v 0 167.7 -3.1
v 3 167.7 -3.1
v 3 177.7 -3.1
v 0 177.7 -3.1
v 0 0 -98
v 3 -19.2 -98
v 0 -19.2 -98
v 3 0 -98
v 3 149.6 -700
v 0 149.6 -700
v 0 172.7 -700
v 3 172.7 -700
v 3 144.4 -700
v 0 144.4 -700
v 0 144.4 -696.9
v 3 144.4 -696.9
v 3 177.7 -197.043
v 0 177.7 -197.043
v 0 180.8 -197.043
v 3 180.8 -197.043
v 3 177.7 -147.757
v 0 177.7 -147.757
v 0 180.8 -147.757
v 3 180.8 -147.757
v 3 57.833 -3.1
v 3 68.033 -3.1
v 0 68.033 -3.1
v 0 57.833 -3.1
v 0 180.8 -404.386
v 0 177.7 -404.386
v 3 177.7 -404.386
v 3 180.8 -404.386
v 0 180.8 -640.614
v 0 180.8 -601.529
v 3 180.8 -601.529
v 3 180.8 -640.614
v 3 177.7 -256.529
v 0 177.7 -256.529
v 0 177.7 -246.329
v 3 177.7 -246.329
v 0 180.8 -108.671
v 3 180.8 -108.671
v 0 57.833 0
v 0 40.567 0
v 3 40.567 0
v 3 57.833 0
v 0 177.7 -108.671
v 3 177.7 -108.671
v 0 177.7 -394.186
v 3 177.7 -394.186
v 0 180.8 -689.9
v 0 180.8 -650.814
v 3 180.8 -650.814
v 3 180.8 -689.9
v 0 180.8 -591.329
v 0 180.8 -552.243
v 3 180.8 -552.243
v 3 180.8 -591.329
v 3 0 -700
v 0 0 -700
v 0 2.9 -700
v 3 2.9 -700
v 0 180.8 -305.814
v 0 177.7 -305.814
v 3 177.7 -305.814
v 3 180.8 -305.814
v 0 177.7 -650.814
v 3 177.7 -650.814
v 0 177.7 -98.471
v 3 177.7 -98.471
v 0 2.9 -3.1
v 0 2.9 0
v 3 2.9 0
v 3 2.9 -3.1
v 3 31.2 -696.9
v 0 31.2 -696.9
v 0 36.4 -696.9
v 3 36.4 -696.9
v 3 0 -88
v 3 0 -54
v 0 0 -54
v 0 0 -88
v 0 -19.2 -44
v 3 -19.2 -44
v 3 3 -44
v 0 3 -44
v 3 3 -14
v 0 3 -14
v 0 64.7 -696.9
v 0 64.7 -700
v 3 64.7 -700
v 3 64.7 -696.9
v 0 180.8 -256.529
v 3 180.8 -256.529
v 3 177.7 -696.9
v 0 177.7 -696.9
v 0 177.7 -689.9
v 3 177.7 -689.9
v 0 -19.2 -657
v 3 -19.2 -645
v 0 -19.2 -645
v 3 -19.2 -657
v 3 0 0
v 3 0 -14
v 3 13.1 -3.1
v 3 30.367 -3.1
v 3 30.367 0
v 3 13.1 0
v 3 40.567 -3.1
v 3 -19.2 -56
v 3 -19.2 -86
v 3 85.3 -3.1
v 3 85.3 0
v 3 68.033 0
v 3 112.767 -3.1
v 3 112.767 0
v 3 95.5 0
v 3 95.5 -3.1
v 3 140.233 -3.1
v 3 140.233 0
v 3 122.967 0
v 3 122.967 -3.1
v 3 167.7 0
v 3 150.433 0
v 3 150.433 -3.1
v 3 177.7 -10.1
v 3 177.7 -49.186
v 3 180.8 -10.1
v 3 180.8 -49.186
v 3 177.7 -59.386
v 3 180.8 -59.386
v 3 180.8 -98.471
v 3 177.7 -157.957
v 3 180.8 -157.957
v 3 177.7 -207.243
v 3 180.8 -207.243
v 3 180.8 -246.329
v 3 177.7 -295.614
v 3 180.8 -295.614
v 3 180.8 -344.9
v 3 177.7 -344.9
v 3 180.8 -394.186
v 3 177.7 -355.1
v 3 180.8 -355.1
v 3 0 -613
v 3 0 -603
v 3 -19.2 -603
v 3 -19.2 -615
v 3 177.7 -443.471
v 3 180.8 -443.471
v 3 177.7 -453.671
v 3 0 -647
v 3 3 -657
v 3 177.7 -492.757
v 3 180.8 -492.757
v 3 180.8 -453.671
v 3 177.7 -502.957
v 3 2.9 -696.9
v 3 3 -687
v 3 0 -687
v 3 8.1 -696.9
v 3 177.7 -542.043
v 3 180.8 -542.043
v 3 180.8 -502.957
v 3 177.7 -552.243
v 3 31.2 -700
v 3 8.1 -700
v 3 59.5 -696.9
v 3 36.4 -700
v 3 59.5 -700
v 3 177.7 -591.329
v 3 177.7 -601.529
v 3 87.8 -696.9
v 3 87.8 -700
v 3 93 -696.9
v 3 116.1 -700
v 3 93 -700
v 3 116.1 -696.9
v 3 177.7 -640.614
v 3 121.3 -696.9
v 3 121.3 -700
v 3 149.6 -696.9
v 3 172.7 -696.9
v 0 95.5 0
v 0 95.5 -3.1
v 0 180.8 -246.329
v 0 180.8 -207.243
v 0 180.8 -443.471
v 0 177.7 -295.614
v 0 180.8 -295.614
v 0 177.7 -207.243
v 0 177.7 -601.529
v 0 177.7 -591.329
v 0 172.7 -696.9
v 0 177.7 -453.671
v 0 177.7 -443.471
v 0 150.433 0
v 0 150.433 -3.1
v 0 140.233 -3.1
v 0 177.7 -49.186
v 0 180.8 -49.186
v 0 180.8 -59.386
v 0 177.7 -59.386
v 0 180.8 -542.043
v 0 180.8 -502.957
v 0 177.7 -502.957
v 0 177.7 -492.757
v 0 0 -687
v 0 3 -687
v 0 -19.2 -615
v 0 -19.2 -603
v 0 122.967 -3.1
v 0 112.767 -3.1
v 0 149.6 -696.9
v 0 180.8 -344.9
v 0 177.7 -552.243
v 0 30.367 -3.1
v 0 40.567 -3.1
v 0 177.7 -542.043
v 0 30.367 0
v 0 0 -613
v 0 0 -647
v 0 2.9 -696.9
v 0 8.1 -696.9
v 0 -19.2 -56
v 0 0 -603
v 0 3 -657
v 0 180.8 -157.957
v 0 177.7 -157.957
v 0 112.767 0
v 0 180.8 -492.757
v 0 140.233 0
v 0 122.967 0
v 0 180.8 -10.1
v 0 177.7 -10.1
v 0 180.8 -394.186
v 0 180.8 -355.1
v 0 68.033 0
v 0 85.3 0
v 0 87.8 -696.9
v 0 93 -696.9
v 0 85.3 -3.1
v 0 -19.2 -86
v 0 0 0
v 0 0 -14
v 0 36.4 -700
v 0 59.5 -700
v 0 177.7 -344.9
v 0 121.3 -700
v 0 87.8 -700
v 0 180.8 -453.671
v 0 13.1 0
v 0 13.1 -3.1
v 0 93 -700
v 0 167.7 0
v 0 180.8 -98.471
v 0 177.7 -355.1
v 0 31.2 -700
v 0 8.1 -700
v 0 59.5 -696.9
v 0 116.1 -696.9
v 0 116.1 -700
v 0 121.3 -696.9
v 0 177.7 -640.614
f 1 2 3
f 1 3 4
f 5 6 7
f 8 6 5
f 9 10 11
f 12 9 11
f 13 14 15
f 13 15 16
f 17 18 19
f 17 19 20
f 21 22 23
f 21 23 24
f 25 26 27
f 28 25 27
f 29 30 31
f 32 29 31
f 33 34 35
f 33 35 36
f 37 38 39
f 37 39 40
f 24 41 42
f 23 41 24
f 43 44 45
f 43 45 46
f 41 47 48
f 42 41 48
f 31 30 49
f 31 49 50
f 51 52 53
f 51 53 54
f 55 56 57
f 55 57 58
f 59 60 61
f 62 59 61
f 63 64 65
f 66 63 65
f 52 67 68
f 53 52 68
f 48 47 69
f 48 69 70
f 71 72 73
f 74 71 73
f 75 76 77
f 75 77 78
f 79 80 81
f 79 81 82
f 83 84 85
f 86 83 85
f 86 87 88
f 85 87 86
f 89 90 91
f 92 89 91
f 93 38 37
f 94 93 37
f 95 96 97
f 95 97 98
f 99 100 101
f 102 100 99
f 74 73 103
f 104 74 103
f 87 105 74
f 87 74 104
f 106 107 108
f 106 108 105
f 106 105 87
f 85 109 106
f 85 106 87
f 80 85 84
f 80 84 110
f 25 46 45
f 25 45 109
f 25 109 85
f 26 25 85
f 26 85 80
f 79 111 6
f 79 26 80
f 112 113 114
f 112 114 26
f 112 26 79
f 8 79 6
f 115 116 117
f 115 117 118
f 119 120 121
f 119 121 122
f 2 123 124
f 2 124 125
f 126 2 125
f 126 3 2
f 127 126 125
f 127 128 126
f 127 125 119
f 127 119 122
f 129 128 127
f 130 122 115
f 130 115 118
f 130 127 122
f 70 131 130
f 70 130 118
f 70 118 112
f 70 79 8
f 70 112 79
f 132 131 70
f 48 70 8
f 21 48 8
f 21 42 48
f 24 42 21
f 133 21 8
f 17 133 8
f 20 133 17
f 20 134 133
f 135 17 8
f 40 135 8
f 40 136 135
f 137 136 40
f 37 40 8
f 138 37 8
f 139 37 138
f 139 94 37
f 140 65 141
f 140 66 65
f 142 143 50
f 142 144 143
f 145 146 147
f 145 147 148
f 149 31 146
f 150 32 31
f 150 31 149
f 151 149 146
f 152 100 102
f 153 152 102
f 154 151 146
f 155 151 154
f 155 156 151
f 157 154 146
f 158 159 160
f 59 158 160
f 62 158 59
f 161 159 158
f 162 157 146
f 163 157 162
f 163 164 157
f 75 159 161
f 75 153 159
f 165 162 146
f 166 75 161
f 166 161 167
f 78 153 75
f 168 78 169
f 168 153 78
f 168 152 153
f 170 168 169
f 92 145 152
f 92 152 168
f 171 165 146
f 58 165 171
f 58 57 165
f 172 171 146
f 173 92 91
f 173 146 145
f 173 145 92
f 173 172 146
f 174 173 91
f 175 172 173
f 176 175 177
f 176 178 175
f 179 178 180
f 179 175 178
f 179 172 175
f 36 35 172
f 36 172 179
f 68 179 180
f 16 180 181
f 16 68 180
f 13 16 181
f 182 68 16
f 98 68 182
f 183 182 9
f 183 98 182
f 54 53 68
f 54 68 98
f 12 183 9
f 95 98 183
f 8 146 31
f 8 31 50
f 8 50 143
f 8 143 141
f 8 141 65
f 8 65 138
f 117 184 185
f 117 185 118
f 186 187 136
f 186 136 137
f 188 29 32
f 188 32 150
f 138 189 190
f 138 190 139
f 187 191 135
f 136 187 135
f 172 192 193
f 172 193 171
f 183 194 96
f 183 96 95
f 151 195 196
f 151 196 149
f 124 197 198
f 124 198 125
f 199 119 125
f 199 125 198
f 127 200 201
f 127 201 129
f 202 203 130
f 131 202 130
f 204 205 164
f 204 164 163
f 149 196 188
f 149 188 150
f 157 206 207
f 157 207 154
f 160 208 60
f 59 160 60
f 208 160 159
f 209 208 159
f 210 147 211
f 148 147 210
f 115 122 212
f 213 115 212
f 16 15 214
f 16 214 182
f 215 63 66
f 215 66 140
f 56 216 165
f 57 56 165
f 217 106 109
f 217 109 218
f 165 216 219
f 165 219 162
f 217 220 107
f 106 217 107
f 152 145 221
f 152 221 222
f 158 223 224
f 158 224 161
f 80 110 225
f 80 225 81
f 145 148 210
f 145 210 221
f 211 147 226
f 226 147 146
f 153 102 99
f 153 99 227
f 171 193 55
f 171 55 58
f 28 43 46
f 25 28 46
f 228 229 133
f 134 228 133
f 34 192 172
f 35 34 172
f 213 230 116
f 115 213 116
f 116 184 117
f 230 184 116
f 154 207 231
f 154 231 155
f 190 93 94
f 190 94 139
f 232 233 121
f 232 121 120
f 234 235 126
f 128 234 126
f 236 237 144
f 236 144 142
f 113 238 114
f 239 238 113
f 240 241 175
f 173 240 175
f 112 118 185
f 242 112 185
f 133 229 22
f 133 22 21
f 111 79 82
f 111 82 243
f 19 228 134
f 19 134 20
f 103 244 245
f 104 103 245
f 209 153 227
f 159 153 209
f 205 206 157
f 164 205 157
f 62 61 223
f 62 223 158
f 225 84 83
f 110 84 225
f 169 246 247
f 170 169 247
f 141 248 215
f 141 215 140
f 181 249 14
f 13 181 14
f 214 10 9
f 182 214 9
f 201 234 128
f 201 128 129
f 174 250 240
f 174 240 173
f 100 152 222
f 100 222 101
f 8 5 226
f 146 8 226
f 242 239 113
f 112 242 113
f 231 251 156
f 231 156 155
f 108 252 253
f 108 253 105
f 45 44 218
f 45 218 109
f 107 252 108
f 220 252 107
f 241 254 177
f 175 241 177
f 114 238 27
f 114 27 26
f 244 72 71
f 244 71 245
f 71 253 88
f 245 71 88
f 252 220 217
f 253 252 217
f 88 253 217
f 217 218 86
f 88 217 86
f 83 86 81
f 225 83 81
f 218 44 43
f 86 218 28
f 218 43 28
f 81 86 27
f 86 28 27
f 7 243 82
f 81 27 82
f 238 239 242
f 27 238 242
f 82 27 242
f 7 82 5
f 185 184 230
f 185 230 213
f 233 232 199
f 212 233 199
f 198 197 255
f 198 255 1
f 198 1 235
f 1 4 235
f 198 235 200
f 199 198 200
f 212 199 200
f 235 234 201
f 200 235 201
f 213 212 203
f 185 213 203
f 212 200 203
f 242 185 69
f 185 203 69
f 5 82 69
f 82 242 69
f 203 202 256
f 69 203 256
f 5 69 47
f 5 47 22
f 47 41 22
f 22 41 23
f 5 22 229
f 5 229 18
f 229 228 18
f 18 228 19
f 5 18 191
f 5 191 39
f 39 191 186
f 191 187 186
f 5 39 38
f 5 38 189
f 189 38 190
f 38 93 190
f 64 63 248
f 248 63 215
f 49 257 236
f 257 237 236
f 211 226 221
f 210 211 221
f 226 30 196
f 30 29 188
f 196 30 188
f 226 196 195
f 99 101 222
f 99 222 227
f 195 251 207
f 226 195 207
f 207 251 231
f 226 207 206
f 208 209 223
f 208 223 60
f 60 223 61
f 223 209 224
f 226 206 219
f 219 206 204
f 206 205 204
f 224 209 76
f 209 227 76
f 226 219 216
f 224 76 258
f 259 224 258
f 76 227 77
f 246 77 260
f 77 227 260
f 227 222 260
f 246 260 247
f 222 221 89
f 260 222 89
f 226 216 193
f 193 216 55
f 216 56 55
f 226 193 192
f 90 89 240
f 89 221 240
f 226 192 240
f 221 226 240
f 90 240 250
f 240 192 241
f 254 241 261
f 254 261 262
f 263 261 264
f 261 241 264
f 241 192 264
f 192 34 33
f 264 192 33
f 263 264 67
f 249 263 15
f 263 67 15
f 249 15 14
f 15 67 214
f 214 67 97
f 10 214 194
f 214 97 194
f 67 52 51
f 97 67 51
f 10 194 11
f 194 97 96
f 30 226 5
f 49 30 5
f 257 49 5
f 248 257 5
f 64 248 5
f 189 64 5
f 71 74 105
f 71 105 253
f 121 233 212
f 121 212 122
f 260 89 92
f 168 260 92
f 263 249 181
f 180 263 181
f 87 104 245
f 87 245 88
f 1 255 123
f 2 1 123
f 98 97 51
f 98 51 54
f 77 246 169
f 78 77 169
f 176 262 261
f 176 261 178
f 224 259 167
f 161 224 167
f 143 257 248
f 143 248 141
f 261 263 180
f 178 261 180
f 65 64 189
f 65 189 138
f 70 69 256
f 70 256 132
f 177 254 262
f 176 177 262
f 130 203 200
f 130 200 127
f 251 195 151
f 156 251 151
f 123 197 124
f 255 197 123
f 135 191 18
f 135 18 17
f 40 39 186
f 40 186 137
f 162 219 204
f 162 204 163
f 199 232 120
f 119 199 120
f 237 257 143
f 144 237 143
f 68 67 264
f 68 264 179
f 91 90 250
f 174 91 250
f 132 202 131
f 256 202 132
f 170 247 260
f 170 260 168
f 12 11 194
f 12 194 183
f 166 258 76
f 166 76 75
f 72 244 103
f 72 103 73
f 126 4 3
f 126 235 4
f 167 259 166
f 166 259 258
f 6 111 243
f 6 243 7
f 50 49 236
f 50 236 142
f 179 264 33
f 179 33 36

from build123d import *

# Parameters (mm, degrees)
SKETCH1_W                      = 700
SKETCH1_H                      = 180.8
BOSS_EXTRUDE1_DEPTH            = 3
SKETCH2_W                      = 54
SKETCH2_H                      = 19.2
BOSS_EXTRUDE2_DEPTH            = 3
CUT_EXTRUDE1_DEPTH             = 10
CUT_EXTRUDE2_DEPTH             = 10
SKETCH5_W                      = 30
SKETCH5_H                      = 3
CUT_EXTRUDE3_DEPTH             = 10
SKETCH9_W                      = 30
SKETCH9_H                      = 3
CUT_EXTRUDE6_DEPTH             = 10
TAB_START                      = 2.9
TAB_AND_SLOT_SLOT3_OUTLINE_W   = 3
TAB_AND_SLOT_SLOT3_OUTLINE_H   = 3.1
TAB_AND_SLOT_SLOT3_DEPTH       = 5.2
TAB_START_2                    = 31.2
TAB_AND_SLOT_SLOT3_2_OUTLINE_W = 3
TAB_AND_SLOT_SLOT3_2_OUTLINE_H = 3.1
TAB_AND_SLOT_SLOT3_2_DEPTH     = 5.2
TAB_START_3                    = 59.5
TAB_AND_SLOT_SLOT3_3_OUTLINE_W = 3
TAB_AND_SLOT_SLOT3_3_OUTLINE_H = 3.1
TAB_AND_SLOT_SLOT3_3_DEPTH     = 5.2
TAB_START_4                    = 87.8
TAB_AND_SLOT_SLOT3_4_OUTLINE_W = 3
TAB_AND_SLOT_SLOT3_4_OUTLINE_H = 3.1
TAB_AND_SLOT_SLOT3_4_DEPTH     = 5.2
TAB_START_5                    = 116.1
TAB_AND_SLOT_SLOT3_5_OUTLINE_W = 3
TAB_AND_SLOT_SLOT3_5_OUTLINE_H = 3.1
TAB_AND_SLOT_SLOT3_5_DEPTH     = 5.2
TAB_START_6                    = 144.4
TAB_AND_SLOT_SLOT3_6_OUTLINE_W = 3
TAB_AND_SLOT_SLOT3_6_OUTLINE_H = 3.1
TAB_AND_SLOT_SLOT3_6_DEPTH     = 5.2
TAB_START_7                    = 172.7
TAB_AND_SLOT_SLOT3_7_OUTLINE_W = 3
TAB_AND_SLOT_SLOT3_7_OUTLINE_H = 3.1
TAB_AND_SLOT_SLOT3_7_DEPTH     = 5.2
TAB_START_8                    = 177.7
TAB_AND_SLOT_SLOT4_OUTLINE_W   = 3
TAB_AND_SLOT_SLOT4_OUTLINE_H   = 10.1
TAB_AND_SLOT_SLOT4_OUTLINE_H_2 = 10.2
TAB_AND_SLOT_SLOT4_DEPTH       = 3.1
TAB_AND_SLOT_SLOT5_DEPTH       = 10.2
TAB_START_9                    = 30.366666667
TAB_AND_SLOT_SLOT5_2_DEPTH     = 10.2
TAB_START_10                   = 57.833333333
TAB_AND_SLOT_SLOT5_3_DEPTH     = 10.2
TAB_START_11                   = 85.3
TAB_AND_SLOT_SLOT5_4_DEPTH     = 10.2
TAB_START_12                   = 112.766666667
TAB_AND_SLOT_SLOT5_5_DEPTH     = 10.2
TAB_START_13                   = 140.233333333
TAB_AND_SLOT_SLOT5_6_DEPTH     = 10.2
TAB_START_14                   = 167.7
TAB_AND_SLOT_SLOT5_7_DEPTH     = 10


# Read off the part's stored shape, not the designer's step: Tab and Slot-Slot3, Tab and Slot-Slot4, Tab and Slot-Slot5
with BuildPart() as part:
    # Sketch1 → Boss-Extrude1 (new body)
    with BuildSketch(Plane(origin=(0, 0, 0), x_dir=(0, 0, -1), z_dir=(1, 0, 0))):
        with Locations((350, 90.4)):
            Rectangle(SKETCH1_W, SKETCH1_H)
    extrude(amount=BOSS_EXTRUDE1_DEPTH)

    # Sketch2 → Boss-Extrude2 (add)
    with BuildSketch(Plane(origin=(3, 0, 0), x_dir=(0, 0, -1), z_dir=(1, 0, 0))):
        with Locations((71, -9.6)):
            Rectangle(SKETCH2_W, SKETCH2_H)
        with Locations((630, -9.6)):
            Rectangle(SKETCH2_W, SKETCH2_H)
    extrude(amount=-BOSS_EXTRUDE2_DEPTH)

    # Sketch3 → Cut-Extrude1 (cut)
    with BuildSketch(Plane(origin=(3, 0, 0), x_dir=(0, 0, -1), z_dir=(1, 0, 0))):
        Polygon((54, 0), (88, 0), (86, -19.2), (56, -19.2), align=None)
    extrude(amount=-CUT_EXTRUDE1_DEPTH, mode=Mode.SUBTRACT)

    # Sketch4 → Cut-Extrude2 (cut)
    with BuildSketch(Plane(origin=(3, 0, 0), x_dir=(0, 0, -1), z_dir=(1, 0, 0))):
        Polygon((613, 0), (647, 0), (645, -19.2), (615, -19.2), align=None)
    extrude(amount=-CUT_EXTRUDE2_DEPTH, mode=Mode.SUBTRACT)

    # Sketch5 → Cut-Extrude3 (cut)
    with BuildSketch(Plane(origin=(3, 0, 0), x_dir=(0, 0, -1), z_dir=(1, 0, 0))):
        with Locations((672, 1.5)):
            Rectangle(SKETCH5_W, SKETCH5_H)
    extrude(amount=-CUT_EXTRUDE3_DEPTH, mode=Mode.SUBTRACT)

    # Sketch9 → Cut-Extrude6 (cut)
    with BuildSketch(Plane(origin=(3, 0, 0), x_dir=(0, 0, -1), z_dir=(1, 0, 0))):
        with Locations((29, 1.5)):
            Rectangle(SKETCH9_W, SKETCH9_H)
    extrude(amount=-CUT_EXTRUDE6_DEPTH, mode=Mode.SUBTRACT)

    # Tab and Slot-Slot3 outline → Tab and Slot-Slot3 (cut)
    with BuildSketch(Plane(origin=(0, 0, 0), x_dir=(1, 0, 0), z_dir=(0, 1, 0)).offset(TAB_START)):
        with Locations((1.5, 698.45)):
            Rectangle(TAB_AND_SLOT_SLOT3_OUTLINE_W, TAB_AND_SLOT_SLOT3_OUTLINE_H)
    extrude(amount=TAB_AND_SLOT_SLOT3_DEPTH, mode=Mode.SUBTRACT)

    # Tab and Slot-Slot3 2 outline → Tab and Slot-Slot3 2 (cut)
    with BuildSketch(Plane(origin=(0, 0, 0), x_dir=(1, 0, 0), z_dir=(0, 1, 0)).offset(TAB_START_2)):
        with Locations((1.5, 698.45)):
            Rectangle(TAB_AND_SLOT_SLOT3_2_OUTLINE_W, TAB_AND_SLOT_SLOT3_2_OUTLINE_H)
    extrude(amount=TAB_AND_SLOT_SLOT3_2_DEPTH, mode=Mode.SUBTRACT)

    # Tab and Slot-Slot3 3 outline → Tab and Slot-Slot3 3 (cut)
    with BuildSketch(Plane(origin=(0, 0, 0), x_dir=(1, 0, 0), z_dir=(0, 1, 0)).offset(TAB_START_3)):
        with Locations((1.5, 698.45)):
            Rectangle(TAB_AND_SLOT_SLOT3_3_OUTLINE_W, TAB_AND_SLOT_SLOT3_3_OUTLINE_H)
    extrude(amount=TAB_AND_SLOT_SLOT3_3_DEPTH, mode=Mode.SUBTRACT)

    # Tab and Slot-Slot3 4 outline → Tab and Slot-Slot3 4 (cut)
    with BuildSketch(Plane(origin=(0, 0, 0), x_dir=(1, 0, 0), z_dir=(0, 1, 0)).offset(TAB_START_4)):
        with Locations((1.5, 698.45)):
            Rectangle(TAB_AND_SLOT_SLOT3_4_OUTLINE_W, TAB_AND_SLOT_SLOT3_4_OUTLINE_H)
    extrude(amount=TAB_AND_SLOT_SLOT3_4_DEPTH, mode=Mode.SUBTRACT)

    # Tab and Slot-Slot3 5 outline → Tab and Slot-Slot3 5 (cut)
    with BuildSketch(Plane(origin=(0, 0, 0), x_dir=(1, 0, 0), z_dir=(0, 1, 0)).offset(TAB_START_5)):
        with Locations((1.5, 698.45)):
            Rectangle(TAB_AND_SLOT_SLOT3_5_OUTLINE_W, TAB_AND_SLOT_SLOT3_5_OUTLINE_H)
    extrude(amount=TAB_AND_SLOT_SLOT3_5_DEPTH, mode=Mode.SUBTRACT)

    # Tab and Slot-Slot3 6 outline → Tab and Slot-Slot3 6 (cut)
    with BuildSketch(Plane(origin=(0, 0, 0), x_dir=(1, 0, 0), z_dir=(0, 1, 0)).offset(TAB_START_6)):
        with Locations((1.5, 698.45)):
            Rectangle(TAB_AND_SLOT_SLOT3_6_OUTLINE_W, TAB_AND_SLOT_SLOT3_6_OUTLINE_H)
    extrude(amount=TAB_AND_SLOT_SLOT3_6_DEPTH, mode=Mode.SUBTRACT)

    # Tab and Slot-Slot3 7 outline → Tab and Slot-Slot3 7 (cut)
    with BuildSketch(Plane(origin=(0, 0, 0), x_dir=(1, 0, 0), z_dir=(0, 1, 0)).offset(TAB_START_7)):
        with Locations((1.5, 698.45)):
            Rectangle(TAB_AND_SLOT_SLOT3_7_OUTLINE_W, TAB_AND_SLOT_SLOT3_7_OUTLINE_H)
    extrude(amount=TAB_AND_SLOT_SLOT3_7_DEPTH, mode=Mode.SUBTRACT)

    # Tab and Slot-Slot4 outline → Tab and Slot-Slot4 (cut)
    with BuildSketch(Plane(origin=(0, 0, 0), x_dir=(1, 0, 0), z_dir=(0, 1, 0)).offset(TAB_START_8)):
        with Locations((1.5, 694.95)):
            Rectangle(TAB_AND_SLOT_SLOT4_OUTLINE_W, TAB_AND_SLOT_SLOT4_OUTLINE_H)
        with Locations((1.5, 645.714285714)):
            Rectangle(TAB_AND_SLOT_SLOT4_OUTLINE_W, TAB_AND_SLOT_SLOT4_OUTLINE_H_2)
        with Locations((1.5, 596.428571429)):
            Rectangle(TAB_AND_SLOT_SLOT4_OUTLINE_W, TAB_AND_SLOT_SLOT4_OUTLINE_H_2)
        with Locations((1.5, 547.142857143)):
            Rectangle(TAB_AND_SLOT_SLOT4_OUTLINE_W, TAB_AND_SLOT_SLOT4_OUTLINE_H_2)
        with Locations((1.5, 497.857142857)):
            Rectangle(TAB_AND_SLOT_SLOT4_OUTLINE_W, TAB_AND_SLOT_SLOT4_OUTLINE_H_2)
        with Locations((1.5, 448.571428571)):
            Rectangle(TAB_AND_SLOT_SLOT4_OUTLINE_W, TAB_AND_SLOT_SLOT4_OUTLINE_H_2)
        with Locations((1.5, 399.285714286)):
            Rectangle(TAB_AND_SLOT_SLOT4_OUTLINE_W, TAB_AND_SLOT_SLOT4_OUTLINE_H_2)
        with Locations((1.5, 350)):
            Rectangle(TAB_AND_SLOT_SLOT4_OUTLINE_W, TAB_AND_SLOT_SLOT4_OUTLINE_H_2)
        with Locations((1.5, 300.714285714)):
            Rectangle(TAB_AND_SLOT_SLOT4_OUTLINE_W, TAB_AND_SLOT_SLOT4_OUTLINE_H_2)
        with Locations((1.5, 251.428571429)):
            Rectangle(TAB_AND_SLOT_SLOT4_OUTLINE_W, TAB_AND_SLOT_SLOT4_OUTLINE_H_2)
        with Locations((1.5, 202.142857143)):
            Rectangle(TAB_AND_SLOT_SLOT4_OUTLINE_W, TAB_AND_SLOT_SLOT4_OUTLINE_H_2)
        with Locations((1.5, 152.857142857)):
            Rectangle(TAB_AND_SLOT_SLOT4_OUTLINE_W, TAB_AND_SLOT_SLOT4_OUTLINE_H_2)
        with Locations((1.5, 103.571428571)):
            Rectangle(TAB_AND_SLOT_SLOT4_OUTLINE_W, TAB_AND_SLOT_SLOT4_OUTLINE_H_2)
        with Locations((1.5, 54.285714286)):
            Rectangle(TAB_AND_SLOT_SLOT4_OUTLINE_W, TAB_AND_SLOT_SLOT4_OUTLINE_H_2)
        with Locations((1.5, 5.05)):
            Rectangle(TAB_AND_SLOT_SLOT4_OUTLINE_W, TAB_AND_SLOT_SLOT4_OUTLINE_H)
    extrude(amount=TAB_AND_SLOT_SLOT4_DEPTH, mode=Mode.SUBTRACT)

    # Tab and Slot-Slot5 outline → Tab and Slot-Slot5 (cut)
    with BuildSketch(Plane(origin=(0, 0, 0), x_dir=(1, 0, 0), z_dir=(0, 1, 0)).offset(TAB_START)):
        Polygon((3, 3.1), (1.28e-07, 3.1), (0, 0), (3, 0), align=None)
    extrude(amount=TAB_AND_SLOT_SLOT5_DEPTH, mode=Mode.SUBTRACT)

    # Tab and Slot-Slot5 2 outline → Tab and Slot-Slot5 2 (cut)
    with BuildSketch(Plane(origin=(0, 0, 0), x_dir=(1, 0, 0), z_dir=(0, 1, 0)).offset(TAB_START_9)):
        Polygon((3, 3.1), (1.28e-07, 3.1), (0, 0), (3, 0), align=None)
    extrude(amount=TAB_AND_SLOT_SLOT5_2_DEPTH, mode=Mode.SUBTRACT)

    # Tab and Slot-Slot5 3 outline → Tab and Slot-Slot5 3 (cut)
    with BuildSketch(Plane(origin=(0, 0, 0), x_dir=(1, 0, 0), z_dir=(0, 1, 0)).offset(TAB_START_10)):
        Polygon((3, 3.1), (1.28e-07, 3.1), (0, 0), (3, 0), align=None)
    extrude(amount=TAB_AND_SLOT_SLOT5_3_DEPTH, mode=Mode.SUBTRACT)

    # Tab and Slot-Slot5 4 outline → Tab and Slot-Slot5 4 (cut)
    with BuildSketch(Plane(origin=(0, 0, 0), x_dir=(1, 0, 0), z_dir=(0, 1, 0)).offset(TAB_START_11)):
        Polygon((3, 3.1), (1.28e-07, 3.1), (0, 0), (3, 0), align=None)
    extrude(amount=TAB_AND_SLOT_SLOT5_4_DEPTH, mode=Mode.SUBTRACT)

    # Tab and Slot-Slot5 5 outline → Tab and Slot-Slot5 5 (cut)
    with BuildSketch(Plane(origin=(0, 0, 0), x_dir=(1, 0, 0), z_dir=(0, 1, 0)).offset(TAB_START_12)):
        Polygon((3, 3.1), (1.28e-07, 3.1), (0, 0), (3, 0), align=None)
    extrude(amount=TAB_AND_SLOT_SLOT5_5_DEPTH, mode=Mode.SUBTRACT)

    # Tab and Slot-Slot5 6 outline → Tab and Slot-Slot5 6 (cut)
    with BuildSketch(Plane(origin=(0, 0, 0), x_dir=(1, 0, 0), z_dir=(0, 1, 0)).offset(TAB_START_13)):
        Polygon((3, 3.1), (1.28e-07, 3.1), (0, 0), (3, 0), align=None)
    extrude(amount=TAB_AND_SLOT_SLOT5_6_DEPTH, mode=Mode.SUBTRACT)

    # Tab and Slot-Slot5 7 outline → Tab and Slot-Slot5 7 (cut)
    with BuildSketch(Plane(origin=(0, 0, 0), x_dir=(1, 0, 0), z_dir=(0, 1, 0)).offset(TAB_START_14)):
        Polygon((3, 3.1), (1.28e-07, 3.1), (0, 0), (3, 0), align=None)
    extrude(amount=TAB_AND_SLOT_SLOT5_7_DEPTH, mode=Mode.SUBTRACT)


solid = part.part
